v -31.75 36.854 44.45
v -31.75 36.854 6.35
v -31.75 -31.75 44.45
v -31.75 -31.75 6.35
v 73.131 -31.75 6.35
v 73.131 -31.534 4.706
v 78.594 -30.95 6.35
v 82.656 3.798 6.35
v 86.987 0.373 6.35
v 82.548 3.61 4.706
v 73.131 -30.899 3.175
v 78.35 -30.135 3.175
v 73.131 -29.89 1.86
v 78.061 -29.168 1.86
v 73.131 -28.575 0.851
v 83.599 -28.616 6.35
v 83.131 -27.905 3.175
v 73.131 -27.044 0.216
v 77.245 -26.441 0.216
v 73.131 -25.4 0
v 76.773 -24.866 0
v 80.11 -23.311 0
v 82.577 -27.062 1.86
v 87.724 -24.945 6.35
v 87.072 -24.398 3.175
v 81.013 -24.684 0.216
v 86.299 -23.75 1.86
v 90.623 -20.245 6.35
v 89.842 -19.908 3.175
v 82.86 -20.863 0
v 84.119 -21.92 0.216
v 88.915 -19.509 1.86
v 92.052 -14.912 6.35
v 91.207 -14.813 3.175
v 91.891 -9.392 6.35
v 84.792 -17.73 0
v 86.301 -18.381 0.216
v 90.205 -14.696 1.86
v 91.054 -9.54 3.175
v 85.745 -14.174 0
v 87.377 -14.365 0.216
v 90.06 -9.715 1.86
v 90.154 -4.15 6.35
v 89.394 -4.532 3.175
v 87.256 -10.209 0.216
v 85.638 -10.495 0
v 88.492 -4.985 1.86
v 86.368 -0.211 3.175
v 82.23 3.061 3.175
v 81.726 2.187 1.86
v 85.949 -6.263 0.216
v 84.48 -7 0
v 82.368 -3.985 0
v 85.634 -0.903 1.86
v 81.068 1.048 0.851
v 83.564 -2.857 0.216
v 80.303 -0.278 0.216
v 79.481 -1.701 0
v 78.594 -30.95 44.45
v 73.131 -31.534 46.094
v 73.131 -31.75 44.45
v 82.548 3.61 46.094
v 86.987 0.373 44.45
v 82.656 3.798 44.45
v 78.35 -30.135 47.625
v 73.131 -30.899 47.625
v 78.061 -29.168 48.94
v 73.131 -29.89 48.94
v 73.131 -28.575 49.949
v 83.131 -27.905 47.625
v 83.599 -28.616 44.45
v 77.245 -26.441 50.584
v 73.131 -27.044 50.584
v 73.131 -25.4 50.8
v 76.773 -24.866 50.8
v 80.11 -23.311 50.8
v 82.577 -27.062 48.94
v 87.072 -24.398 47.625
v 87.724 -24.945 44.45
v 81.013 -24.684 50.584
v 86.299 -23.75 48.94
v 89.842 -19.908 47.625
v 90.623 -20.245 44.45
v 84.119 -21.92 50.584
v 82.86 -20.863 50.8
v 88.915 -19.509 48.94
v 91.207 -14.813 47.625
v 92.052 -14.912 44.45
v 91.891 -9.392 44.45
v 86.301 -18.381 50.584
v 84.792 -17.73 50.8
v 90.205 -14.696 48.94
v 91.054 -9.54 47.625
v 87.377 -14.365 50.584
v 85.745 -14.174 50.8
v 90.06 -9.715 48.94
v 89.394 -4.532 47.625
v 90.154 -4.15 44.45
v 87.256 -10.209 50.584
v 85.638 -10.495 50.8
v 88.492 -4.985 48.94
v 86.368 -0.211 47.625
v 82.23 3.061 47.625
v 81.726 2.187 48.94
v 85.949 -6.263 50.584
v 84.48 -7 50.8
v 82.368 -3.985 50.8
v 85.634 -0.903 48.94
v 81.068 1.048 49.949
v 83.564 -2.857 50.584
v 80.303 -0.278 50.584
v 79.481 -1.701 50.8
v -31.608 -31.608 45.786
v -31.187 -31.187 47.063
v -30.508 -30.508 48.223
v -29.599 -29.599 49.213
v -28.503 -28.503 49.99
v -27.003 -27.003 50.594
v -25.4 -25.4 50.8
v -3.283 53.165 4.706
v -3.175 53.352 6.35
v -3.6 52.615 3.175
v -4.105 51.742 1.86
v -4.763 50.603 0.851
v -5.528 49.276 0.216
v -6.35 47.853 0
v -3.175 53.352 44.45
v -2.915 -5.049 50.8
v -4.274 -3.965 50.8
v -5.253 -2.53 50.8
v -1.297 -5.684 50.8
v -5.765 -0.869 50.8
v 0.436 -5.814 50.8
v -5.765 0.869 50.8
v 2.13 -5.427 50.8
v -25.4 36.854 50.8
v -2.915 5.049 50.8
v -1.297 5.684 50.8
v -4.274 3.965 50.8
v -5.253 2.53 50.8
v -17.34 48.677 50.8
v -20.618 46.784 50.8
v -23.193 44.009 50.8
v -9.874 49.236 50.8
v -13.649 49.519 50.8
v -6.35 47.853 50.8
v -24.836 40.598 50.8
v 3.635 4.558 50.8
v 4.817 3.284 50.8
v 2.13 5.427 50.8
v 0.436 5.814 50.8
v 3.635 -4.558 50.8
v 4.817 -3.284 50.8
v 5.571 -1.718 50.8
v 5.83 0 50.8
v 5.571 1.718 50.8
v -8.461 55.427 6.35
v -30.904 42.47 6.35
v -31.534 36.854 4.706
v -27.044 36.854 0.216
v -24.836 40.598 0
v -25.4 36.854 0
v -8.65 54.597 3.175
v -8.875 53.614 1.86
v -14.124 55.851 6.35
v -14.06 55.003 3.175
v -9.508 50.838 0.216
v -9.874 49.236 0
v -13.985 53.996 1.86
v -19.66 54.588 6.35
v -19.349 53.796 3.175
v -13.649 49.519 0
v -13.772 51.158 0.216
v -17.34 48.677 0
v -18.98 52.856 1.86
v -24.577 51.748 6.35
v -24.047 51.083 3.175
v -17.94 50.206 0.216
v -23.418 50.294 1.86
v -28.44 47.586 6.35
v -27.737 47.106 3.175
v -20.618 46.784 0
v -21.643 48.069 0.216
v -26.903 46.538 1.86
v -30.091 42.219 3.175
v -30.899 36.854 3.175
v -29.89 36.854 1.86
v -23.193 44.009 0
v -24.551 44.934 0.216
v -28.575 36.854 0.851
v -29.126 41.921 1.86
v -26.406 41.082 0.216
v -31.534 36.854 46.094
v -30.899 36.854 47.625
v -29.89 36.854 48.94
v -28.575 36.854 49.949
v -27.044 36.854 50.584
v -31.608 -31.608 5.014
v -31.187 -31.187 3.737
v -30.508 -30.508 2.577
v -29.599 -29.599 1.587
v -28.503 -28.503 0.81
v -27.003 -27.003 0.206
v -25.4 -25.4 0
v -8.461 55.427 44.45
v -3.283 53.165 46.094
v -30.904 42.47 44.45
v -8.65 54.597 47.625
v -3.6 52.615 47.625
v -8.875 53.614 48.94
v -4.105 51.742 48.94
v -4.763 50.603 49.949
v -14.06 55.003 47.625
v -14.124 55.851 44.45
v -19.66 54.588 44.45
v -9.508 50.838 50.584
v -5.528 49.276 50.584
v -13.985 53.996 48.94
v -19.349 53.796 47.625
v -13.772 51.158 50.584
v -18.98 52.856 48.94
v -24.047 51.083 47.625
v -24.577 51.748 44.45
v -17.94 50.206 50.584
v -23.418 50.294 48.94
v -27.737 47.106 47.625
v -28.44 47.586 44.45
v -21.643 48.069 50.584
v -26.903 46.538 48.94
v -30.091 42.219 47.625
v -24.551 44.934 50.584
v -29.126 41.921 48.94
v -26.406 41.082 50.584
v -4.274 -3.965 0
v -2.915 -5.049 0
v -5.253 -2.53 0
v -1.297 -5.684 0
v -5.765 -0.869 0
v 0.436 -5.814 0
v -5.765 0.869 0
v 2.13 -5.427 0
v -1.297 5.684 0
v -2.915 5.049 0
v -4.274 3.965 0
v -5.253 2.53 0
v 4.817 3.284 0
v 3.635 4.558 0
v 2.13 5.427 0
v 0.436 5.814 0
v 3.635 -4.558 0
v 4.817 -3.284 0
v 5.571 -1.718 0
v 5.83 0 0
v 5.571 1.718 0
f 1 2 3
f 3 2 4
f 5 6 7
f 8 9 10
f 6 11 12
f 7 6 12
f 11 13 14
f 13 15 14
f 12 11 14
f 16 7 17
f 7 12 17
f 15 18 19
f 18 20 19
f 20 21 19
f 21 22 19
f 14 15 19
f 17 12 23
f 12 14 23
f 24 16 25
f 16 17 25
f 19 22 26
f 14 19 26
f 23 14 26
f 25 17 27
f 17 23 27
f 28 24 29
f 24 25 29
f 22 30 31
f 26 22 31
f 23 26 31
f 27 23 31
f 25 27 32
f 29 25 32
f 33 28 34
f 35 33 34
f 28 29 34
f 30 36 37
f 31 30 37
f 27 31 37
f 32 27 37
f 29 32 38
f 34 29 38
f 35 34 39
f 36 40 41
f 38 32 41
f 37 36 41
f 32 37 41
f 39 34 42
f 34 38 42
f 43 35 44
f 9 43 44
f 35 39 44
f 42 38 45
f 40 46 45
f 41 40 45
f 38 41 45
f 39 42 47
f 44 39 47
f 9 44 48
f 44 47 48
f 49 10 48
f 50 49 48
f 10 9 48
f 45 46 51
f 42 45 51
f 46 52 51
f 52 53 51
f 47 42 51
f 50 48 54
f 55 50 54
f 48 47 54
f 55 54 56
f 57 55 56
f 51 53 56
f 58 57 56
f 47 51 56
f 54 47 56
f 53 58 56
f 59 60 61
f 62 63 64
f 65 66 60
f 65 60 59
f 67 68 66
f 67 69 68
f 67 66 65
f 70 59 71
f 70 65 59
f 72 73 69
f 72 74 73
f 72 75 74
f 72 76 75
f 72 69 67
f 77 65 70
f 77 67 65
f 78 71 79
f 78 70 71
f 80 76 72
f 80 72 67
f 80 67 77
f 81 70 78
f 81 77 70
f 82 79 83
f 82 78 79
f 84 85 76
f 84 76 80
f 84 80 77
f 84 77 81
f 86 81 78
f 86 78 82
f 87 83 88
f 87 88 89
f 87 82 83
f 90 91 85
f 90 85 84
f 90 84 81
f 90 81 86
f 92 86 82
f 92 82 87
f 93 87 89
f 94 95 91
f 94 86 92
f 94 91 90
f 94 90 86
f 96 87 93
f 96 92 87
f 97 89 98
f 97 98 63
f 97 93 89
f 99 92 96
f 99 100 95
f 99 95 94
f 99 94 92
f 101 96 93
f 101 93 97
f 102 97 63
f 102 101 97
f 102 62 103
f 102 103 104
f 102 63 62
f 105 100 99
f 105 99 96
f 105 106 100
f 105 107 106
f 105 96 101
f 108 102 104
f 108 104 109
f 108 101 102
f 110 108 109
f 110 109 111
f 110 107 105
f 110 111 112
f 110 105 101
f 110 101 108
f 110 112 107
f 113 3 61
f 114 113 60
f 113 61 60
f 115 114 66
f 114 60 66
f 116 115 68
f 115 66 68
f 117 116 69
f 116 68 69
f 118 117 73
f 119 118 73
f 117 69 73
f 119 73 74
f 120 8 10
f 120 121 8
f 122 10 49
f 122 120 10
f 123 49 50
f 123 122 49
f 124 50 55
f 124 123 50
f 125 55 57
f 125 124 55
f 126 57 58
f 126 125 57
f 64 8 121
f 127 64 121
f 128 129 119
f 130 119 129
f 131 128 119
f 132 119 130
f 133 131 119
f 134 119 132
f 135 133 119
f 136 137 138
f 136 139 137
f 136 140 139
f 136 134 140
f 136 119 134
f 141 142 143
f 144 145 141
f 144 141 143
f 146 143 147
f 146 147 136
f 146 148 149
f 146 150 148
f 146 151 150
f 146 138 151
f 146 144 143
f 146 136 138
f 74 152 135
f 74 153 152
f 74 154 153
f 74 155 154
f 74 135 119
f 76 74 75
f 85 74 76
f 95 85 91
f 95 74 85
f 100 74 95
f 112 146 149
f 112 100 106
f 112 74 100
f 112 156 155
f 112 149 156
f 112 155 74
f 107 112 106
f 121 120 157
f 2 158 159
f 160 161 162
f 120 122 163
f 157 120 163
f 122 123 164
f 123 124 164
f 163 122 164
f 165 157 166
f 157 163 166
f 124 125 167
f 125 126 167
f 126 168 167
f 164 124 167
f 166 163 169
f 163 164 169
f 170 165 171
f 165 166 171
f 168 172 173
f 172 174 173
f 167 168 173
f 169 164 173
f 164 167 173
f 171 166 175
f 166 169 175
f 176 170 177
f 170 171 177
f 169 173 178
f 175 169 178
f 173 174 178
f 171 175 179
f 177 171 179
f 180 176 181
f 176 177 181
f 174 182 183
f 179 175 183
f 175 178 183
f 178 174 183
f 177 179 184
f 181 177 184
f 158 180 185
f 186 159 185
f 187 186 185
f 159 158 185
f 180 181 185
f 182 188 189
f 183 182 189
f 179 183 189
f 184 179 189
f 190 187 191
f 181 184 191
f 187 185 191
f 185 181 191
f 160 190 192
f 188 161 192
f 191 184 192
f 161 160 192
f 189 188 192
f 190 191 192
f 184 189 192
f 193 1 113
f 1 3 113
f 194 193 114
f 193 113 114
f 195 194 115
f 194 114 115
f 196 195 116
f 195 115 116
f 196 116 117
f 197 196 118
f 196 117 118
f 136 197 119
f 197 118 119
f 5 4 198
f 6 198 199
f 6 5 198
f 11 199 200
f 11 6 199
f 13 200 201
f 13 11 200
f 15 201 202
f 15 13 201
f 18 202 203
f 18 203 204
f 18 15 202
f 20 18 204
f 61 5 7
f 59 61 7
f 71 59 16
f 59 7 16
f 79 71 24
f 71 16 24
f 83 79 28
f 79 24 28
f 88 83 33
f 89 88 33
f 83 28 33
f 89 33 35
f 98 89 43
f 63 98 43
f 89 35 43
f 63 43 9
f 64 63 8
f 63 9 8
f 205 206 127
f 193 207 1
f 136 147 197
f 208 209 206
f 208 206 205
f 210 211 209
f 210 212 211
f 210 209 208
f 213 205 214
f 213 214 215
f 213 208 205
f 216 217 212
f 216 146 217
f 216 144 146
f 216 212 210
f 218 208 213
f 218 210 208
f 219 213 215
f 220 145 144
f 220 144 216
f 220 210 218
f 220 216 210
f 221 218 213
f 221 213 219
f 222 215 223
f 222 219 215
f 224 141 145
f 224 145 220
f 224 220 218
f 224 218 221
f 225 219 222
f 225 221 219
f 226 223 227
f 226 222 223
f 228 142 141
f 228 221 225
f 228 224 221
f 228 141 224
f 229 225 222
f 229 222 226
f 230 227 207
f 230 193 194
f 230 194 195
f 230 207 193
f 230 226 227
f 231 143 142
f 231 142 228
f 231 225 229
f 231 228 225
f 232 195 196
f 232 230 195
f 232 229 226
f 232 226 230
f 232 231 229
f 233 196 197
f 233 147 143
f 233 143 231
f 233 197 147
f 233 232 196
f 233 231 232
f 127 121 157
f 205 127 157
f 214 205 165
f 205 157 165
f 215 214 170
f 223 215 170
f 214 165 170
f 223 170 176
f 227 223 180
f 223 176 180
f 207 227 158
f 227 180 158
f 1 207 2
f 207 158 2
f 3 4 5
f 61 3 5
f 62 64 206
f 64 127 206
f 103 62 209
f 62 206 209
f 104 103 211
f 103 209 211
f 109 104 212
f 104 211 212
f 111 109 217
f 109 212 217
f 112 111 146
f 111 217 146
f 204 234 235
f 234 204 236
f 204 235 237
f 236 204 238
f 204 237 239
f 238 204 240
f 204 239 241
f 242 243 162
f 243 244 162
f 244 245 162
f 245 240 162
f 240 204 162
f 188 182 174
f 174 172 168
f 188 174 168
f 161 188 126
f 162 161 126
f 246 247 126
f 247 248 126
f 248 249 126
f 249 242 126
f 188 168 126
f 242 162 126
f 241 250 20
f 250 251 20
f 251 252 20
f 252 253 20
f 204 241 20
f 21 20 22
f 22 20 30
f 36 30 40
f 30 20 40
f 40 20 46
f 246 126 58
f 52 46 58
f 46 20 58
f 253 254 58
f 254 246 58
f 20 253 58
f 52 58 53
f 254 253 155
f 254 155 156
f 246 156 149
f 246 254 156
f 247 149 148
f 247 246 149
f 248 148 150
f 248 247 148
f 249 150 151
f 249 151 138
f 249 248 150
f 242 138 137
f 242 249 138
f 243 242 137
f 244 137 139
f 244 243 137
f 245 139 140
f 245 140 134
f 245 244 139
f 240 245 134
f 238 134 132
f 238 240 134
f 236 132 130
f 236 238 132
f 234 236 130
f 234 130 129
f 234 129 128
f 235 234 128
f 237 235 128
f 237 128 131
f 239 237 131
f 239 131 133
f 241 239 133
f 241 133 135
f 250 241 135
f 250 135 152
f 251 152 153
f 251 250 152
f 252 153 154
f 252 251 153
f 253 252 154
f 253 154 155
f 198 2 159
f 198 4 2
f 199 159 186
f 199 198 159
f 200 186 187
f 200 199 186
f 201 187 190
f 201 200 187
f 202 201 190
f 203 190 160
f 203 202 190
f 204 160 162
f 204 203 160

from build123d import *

# Parameters (mm, degrees)
SKETCH1_R           = 5.830122714
BOSS_EXTRUDE1_DEPTH = 50.8
FILLET1_R           = 6.35


with BuildPart() as part:
    # Sketch1 → Boss-Extrude1 (new body)
    with BuildSketch(Plane.XY):
        with BuildLine():
            Line((-31.75, -31.75), (73.130794165, -31.75))
            ThreePointArc((73.130794165, -31.75), (91.531681156, -17.630502809), (82.655794165, 3.797783942))
            Line((82.655794165, 3.797783942), (-3.175, 53.352216058))
            ThreePointArc((-3.175, 53.352216058), (-22.225, 53.352216058), (-31.75, 36.854432116))
            Line((-31.75, 36.854432116), (-31.75, -31.75))
        make_face()
        Circle(SKETCH1_R, mode=Mode.SUBTRACT)
    extrude(amount=BOSS_EXTRUDE1_DEPTH)

    # Fillet1
    fillet1_edges = [part.edges().sort_by_distance(p)[0] for p in [
        (91.531681156, -17.630502809, 50.8),
        (39.740397082, 28.575, 50.8),
        (-22.225, 53.352216058, 50.8),
        (-31.75, 2.552216058, 50.8),
        (-22.225, 53.352216058, 0),
        (39.740397082, 28.575, 0),
        (91.531681156, -17.630502809, 0),
        (20.690397082, -31.75, 0),
        (-31.75, 2.552216058, 0),
        (20.690397082, -31.75, 50.8),
    ]]
    fillet(fillet1_edges, radius=FILLET1_R)


solid = part.part
